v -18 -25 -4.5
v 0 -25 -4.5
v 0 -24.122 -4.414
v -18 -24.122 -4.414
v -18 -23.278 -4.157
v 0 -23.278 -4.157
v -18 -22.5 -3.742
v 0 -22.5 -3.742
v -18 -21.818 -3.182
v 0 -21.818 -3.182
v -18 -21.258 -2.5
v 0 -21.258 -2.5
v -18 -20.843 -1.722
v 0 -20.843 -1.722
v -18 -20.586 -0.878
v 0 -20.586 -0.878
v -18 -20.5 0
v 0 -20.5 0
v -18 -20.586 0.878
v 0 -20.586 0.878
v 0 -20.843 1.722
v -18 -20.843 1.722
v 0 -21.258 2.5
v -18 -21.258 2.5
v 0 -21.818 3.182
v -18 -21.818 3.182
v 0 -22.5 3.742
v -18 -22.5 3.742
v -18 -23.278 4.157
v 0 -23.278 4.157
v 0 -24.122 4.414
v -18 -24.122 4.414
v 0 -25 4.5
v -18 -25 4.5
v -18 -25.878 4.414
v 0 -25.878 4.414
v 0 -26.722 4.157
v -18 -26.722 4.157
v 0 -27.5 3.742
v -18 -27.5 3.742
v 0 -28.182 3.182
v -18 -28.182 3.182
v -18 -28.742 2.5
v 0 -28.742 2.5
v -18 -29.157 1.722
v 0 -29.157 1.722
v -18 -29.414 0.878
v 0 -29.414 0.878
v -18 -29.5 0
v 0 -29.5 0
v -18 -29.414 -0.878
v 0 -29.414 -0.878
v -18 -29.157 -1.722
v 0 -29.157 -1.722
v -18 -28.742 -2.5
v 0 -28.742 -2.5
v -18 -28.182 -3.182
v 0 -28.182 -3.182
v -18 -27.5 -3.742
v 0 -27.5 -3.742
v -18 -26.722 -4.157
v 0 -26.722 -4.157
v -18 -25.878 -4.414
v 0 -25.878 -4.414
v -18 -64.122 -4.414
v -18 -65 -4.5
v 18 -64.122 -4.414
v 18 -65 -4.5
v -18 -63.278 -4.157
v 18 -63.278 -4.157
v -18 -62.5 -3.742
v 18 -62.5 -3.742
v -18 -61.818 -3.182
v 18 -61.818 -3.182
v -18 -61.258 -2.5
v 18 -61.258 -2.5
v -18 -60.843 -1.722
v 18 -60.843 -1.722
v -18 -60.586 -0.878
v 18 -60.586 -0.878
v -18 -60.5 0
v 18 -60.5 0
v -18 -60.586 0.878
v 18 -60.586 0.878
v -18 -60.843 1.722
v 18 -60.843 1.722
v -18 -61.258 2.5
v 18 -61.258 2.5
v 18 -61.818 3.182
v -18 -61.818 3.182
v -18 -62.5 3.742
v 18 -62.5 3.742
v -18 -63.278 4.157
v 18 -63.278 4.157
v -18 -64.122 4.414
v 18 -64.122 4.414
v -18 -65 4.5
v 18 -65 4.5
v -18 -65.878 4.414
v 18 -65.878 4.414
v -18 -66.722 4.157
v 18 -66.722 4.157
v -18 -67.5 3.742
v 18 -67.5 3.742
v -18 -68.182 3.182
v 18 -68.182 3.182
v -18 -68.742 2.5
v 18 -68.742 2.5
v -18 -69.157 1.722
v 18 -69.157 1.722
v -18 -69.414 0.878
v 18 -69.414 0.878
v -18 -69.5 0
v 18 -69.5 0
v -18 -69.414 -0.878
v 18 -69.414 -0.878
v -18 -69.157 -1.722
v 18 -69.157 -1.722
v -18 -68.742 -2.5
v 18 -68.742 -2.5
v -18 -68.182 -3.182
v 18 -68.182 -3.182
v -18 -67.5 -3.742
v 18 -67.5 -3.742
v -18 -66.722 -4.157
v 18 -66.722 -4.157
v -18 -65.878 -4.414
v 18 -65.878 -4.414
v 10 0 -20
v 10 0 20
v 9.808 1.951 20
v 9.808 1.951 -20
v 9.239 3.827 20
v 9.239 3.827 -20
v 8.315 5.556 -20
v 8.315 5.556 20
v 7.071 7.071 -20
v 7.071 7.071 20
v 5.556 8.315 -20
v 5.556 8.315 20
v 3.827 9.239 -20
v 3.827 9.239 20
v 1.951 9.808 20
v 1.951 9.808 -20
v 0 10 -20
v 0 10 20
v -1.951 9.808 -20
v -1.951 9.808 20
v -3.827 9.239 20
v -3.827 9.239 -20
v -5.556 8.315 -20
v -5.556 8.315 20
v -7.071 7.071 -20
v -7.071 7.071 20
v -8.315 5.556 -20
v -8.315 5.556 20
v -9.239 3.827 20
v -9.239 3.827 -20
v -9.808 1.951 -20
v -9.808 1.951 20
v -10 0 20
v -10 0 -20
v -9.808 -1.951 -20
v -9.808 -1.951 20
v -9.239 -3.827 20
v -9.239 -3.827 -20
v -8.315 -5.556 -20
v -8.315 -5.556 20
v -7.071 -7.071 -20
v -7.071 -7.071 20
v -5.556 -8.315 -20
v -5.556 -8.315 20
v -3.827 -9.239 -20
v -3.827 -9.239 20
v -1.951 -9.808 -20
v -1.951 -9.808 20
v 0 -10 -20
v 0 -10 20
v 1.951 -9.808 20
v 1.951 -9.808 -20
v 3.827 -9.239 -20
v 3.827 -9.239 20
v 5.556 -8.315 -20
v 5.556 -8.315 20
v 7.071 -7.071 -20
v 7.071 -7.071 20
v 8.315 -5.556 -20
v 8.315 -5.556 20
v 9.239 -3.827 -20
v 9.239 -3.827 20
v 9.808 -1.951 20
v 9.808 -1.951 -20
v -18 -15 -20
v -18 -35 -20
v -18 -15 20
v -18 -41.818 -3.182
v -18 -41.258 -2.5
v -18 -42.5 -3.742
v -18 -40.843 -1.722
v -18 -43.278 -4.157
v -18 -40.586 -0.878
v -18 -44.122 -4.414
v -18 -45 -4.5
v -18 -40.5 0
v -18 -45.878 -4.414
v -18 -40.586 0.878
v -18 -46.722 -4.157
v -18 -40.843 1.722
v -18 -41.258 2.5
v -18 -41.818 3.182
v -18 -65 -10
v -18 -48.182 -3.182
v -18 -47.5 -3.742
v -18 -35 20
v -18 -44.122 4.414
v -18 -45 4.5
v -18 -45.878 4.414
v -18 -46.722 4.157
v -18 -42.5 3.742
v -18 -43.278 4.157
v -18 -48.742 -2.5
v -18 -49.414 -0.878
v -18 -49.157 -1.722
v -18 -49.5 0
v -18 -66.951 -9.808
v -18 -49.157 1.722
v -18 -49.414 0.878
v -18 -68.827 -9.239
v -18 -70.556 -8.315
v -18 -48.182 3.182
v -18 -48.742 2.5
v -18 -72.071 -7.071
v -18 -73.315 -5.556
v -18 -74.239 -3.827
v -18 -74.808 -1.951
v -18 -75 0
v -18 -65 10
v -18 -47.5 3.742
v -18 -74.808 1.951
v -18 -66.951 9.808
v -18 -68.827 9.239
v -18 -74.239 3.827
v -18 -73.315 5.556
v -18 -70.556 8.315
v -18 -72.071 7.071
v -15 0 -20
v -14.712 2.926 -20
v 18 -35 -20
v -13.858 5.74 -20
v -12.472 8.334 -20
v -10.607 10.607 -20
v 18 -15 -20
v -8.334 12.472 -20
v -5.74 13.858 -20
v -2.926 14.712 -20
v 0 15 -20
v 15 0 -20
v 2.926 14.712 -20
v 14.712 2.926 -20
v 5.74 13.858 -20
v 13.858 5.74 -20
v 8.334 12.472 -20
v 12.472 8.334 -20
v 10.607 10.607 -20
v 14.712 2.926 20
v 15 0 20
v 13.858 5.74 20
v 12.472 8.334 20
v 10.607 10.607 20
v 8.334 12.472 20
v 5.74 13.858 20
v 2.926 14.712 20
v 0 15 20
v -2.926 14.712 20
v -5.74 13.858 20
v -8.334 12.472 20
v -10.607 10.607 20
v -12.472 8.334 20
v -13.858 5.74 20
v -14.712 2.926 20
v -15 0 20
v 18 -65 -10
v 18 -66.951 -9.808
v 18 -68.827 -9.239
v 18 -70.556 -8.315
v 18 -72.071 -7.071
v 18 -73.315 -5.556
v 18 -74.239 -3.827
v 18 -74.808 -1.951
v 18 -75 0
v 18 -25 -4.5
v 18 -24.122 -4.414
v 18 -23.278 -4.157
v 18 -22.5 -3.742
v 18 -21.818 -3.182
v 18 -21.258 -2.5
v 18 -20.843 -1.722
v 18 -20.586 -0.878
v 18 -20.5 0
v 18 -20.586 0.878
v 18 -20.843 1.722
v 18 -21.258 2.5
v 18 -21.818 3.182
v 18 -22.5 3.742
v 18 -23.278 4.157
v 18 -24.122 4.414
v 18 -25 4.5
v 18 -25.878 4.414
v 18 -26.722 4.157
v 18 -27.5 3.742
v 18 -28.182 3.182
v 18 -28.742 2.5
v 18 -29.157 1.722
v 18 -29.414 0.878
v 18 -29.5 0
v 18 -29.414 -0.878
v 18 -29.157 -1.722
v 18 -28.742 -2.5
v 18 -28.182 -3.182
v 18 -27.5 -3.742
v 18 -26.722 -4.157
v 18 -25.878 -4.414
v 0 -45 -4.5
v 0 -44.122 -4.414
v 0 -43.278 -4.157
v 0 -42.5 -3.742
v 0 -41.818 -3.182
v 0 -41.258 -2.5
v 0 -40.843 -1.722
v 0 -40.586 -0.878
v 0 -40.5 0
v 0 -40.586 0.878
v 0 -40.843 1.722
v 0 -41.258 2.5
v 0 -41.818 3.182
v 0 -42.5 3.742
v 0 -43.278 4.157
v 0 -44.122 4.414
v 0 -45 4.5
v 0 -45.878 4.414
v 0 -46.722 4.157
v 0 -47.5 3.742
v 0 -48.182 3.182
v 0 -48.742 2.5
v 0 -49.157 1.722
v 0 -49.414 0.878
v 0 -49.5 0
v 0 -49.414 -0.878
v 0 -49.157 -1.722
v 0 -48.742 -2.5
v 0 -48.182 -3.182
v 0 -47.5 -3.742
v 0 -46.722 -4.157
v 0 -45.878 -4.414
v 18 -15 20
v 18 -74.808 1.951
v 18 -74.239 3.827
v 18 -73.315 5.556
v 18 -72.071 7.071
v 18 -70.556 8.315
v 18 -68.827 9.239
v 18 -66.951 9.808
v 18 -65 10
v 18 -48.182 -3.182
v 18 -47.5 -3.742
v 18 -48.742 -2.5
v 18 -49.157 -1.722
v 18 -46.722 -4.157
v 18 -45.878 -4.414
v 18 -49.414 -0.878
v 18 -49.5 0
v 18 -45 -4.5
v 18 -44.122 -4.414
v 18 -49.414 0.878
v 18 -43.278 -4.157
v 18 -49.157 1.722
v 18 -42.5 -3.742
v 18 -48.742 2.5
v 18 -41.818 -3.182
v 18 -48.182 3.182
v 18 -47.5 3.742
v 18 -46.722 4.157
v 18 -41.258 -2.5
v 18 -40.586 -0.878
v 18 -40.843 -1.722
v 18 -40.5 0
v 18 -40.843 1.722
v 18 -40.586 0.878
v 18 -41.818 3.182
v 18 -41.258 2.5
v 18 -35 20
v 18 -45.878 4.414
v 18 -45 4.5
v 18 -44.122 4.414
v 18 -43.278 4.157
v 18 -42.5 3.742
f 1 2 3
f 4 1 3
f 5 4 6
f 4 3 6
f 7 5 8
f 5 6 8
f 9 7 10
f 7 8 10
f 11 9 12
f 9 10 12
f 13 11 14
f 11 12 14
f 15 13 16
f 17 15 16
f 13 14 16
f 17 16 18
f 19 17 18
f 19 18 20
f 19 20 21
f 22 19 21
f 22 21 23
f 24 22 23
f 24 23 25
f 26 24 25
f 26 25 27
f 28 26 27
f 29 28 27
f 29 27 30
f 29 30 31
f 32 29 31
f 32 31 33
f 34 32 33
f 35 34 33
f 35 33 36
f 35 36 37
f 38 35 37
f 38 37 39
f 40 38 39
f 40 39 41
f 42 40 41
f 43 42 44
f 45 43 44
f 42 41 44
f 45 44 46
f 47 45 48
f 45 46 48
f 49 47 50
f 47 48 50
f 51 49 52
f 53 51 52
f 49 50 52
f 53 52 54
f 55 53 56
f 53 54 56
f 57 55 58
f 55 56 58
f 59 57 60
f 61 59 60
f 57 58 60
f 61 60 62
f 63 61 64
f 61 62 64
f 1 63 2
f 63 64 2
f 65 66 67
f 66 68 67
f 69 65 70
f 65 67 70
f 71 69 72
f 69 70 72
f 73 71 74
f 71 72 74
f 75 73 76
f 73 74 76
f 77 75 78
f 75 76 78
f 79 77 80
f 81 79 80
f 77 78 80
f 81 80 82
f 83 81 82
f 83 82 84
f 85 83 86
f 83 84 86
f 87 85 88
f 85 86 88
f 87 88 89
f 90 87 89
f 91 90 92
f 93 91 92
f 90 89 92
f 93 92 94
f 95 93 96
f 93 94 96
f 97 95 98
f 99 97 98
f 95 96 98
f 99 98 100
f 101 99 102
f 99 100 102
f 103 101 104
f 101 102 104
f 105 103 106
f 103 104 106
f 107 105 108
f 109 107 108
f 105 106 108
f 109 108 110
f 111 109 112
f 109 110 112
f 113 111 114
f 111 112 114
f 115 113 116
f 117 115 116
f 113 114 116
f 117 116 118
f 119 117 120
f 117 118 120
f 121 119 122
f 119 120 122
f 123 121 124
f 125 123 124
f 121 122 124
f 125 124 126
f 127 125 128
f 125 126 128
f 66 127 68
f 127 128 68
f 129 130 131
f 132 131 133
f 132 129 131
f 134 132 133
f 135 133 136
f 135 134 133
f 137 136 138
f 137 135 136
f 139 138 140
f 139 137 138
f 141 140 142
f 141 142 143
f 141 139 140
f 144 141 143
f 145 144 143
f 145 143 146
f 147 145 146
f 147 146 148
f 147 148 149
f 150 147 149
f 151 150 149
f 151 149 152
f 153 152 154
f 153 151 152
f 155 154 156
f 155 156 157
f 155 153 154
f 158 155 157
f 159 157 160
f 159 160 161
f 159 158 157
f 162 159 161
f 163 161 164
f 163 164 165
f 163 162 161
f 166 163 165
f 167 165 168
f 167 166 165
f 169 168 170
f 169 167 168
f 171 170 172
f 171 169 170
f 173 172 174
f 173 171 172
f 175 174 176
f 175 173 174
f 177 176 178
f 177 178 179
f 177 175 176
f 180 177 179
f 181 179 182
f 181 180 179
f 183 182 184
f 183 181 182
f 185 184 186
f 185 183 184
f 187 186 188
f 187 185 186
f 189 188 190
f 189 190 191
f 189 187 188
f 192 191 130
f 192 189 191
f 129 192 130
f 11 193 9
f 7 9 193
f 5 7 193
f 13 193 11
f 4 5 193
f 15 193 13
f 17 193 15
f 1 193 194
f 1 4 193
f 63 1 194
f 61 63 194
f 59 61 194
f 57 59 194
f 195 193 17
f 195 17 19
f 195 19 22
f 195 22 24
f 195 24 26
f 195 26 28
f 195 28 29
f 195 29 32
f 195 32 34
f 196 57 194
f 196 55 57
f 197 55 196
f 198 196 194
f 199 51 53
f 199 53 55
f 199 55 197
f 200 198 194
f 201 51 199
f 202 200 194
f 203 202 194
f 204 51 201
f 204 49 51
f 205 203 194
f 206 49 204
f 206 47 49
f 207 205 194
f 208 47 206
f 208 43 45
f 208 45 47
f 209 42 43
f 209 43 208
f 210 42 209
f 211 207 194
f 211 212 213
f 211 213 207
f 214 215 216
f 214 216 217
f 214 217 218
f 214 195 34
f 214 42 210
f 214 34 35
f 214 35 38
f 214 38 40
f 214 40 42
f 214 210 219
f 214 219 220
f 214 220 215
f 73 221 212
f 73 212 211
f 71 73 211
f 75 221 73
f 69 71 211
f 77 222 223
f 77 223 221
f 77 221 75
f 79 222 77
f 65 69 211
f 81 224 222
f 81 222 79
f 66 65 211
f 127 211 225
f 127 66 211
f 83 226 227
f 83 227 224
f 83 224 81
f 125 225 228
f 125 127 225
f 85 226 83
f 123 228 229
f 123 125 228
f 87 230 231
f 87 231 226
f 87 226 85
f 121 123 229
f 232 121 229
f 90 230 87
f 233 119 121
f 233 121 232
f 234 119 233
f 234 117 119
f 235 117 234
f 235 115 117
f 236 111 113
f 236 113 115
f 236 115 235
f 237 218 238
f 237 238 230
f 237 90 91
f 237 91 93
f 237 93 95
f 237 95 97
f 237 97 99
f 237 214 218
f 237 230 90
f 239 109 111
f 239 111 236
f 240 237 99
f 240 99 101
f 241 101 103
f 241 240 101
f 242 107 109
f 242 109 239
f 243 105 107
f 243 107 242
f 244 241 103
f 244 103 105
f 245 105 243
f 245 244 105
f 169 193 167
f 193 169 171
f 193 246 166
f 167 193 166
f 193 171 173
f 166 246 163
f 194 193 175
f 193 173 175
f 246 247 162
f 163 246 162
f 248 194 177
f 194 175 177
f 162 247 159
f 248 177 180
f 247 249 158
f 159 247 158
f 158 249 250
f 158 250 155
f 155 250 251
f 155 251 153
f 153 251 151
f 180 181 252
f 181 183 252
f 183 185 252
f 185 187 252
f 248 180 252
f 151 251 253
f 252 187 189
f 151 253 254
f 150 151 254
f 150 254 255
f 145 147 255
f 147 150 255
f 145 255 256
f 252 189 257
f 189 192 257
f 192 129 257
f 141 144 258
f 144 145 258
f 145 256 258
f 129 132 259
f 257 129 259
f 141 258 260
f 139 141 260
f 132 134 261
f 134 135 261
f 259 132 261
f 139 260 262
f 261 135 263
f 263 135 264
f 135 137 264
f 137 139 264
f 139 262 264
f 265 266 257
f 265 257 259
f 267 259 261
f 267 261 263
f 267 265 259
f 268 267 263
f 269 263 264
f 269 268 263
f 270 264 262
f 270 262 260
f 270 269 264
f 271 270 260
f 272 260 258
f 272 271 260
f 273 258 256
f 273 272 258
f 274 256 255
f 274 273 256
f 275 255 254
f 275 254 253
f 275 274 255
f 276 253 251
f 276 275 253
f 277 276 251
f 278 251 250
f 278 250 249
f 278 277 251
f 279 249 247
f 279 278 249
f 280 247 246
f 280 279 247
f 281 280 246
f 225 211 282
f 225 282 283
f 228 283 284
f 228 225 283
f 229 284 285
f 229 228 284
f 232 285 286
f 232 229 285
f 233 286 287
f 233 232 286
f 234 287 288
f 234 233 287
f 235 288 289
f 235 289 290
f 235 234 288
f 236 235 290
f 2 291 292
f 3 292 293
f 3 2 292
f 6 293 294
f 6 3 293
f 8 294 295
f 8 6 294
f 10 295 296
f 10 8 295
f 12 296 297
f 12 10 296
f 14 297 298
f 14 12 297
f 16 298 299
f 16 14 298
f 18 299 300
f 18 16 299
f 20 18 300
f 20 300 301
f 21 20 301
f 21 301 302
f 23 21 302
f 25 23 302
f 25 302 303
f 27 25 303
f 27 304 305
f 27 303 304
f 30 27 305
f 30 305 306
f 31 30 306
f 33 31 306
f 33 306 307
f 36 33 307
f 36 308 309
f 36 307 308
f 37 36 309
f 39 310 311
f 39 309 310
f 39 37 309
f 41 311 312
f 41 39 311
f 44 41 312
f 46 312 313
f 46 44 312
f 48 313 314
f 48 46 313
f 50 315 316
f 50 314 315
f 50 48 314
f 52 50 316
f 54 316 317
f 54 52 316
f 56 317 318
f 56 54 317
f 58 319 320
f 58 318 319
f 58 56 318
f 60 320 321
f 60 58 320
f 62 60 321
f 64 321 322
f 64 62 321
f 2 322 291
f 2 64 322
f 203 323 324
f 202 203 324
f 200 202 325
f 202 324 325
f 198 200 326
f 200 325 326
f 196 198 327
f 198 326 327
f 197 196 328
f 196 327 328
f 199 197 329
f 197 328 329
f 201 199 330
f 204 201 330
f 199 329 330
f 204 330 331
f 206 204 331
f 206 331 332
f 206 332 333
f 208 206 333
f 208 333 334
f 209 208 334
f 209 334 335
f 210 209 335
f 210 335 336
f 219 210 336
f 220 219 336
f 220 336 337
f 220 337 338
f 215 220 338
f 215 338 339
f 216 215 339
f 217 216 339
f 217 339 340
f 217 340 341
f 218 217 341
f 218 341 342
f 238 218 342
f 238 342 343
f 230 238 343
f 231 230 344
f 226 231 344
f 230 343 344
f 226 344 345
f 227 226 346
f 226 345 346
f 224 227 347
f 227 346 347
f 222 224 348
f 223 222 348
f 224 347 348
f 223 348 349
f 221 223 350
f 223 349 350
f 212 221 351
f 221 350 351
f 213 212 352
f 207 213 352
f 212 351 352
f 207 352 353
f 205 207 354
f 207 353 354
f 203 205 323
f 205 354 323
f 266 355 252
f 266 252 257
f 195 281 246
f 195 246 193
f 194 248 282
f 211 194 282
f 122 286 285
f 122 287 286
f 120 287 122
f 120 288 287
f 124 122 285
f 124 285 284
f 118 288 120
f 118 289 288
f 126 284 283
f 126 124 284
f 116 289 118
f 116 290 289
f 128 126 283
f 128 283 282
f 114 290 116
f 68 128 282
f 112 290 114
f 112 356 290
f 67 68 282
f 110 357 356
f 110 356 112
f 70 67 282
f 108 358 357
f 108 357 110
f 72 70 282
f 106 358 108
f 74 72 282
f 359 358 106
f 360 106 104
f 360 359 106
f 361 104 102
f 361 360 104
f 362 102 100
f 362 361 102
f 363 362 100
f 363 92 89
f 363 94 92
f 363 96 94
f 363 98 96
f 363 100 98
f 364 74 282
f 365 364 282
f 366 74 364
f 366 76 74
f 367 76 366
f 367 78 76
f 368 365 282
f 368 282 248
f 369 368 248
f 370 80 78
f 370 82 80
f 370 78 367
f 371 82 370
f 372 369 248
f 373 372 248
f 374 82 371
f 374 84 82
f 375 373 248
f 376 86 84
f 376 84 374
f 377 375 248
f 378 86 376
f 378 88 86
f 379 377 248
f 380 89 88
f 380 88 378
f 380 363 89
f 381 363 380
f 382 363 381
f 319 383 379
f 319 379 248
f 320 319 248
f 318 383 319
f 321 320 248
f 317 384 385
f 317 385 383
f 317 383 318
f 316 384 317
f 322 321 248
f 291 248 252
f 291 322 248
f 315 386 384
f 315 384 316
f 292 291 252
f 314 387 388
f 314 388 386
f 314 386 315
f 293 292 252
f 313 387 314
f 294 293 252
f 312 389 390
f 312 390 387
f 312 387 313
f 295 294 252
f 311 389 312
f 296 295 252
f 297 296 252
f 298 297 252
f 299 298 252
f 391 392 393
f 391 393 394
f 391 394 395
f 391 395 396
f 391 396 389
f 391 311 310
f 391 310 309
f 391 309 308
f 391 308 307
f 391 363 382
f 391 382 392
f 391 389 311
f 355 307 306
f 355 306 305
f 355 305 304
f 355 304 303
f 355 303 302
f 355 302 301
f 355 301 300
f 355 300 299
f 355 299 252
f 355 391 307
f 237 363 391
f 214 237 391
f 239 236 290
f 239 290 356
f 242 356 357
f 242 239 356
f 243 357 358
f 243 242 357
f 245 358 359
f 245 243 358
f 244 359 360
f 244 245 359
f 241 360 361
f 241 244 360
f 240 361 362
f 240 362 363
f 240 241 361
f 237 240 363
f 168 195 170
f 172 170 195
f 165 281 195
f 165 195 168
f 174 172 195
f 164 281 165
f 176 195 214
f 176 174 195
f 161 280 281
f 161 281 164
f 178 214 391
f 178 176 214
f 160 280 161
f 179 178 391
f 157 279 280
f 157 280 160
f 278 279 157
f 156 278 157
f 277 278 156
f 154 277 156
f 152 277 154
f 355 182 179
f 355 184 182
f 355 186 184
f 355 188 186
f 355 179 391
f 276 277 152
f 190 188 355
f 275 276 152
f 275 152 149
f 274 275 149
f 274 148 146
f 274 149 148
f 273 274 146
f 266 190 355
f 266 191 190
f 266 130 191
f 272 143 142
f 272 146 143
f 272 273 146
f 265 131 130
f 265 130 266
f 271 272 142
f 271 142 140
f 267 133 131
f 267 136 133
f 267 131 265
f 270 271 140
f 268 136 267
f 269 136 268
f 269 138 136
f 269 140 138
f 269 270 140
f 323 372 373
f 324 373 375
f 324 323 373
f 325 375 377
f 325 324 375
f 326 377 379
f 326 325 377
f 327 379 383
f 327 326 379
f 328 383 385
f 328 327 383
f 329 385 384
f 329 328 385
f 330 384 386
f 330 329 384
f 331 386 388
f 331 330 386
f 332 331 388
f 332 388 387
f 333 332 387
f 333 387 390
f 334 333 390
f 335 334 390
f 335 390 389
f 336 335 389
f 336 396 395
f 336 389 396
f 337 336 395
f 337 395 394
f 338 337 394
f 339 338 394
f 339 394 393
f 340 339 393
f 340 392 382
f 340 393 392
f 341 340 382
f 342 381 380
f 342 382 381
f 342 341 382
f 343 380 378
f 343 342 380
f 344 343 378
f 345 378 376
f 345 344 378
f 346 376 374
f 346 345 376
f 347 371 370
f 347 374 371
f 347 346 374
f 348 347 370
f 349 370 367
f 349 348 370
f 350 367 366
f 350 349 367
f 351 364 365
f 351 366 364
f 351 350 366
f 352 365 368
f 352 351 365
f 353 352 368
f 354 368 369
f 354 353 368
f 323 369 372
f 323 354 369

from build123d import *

# Parameters (mm, degrees)
SKETCH_1_R               = 10
EXTRUDE_1_DEPTH          = 20
SKETCH_2_R               = 4.5
CUT_EXTRUDE_1_DEPTH      = 20
CUT_EXTRUDE_2_DEPTH      = 86.562842403
CUT_EXTRUDE_2_DEPTH_BACK = 86.562842403


with BuildPart() as part:
    # 草图1 → 凸台-拉伸1 (new, symmetric)
    with BuildSketch(Plane.XY):
        with BuildLine():
            Line((0, -75), (18, -75))
            Line((18, -75), (18, -15))
            Line((18, -15), (15, 0))
            ThreePointArc((15, 0), (0, 15), (-15, 0))
            Line((-15, 0), (-18, -15))
            Line((-18, -15), (-18, -75))
            Line((-18, -75), (0, -75))
        make_face()
        Circle(SKETCH_1_R, mode=Mode.SUBTRACT)
    extrude(amount=EXTRUDE_1_DEPTH, both=True)

    # 草图2 → 切除-拉伸1 (cut, symmetric)
    with BuildSketch(Plane(origin=(0, 0, 0), x_dir=(0, 0, -1), z_dir=(1, 0, 0))):
        with Locations((0, -45)):
            Circle(SKETCH_2_R)
        with Locations((0, -25)):
            Circle(SKETCH_2_R)
        with Locations((0, -65)):
            Circle(SKETCH_2_R)
    extrude(amount=CUT_EXTRUDE_1_DEPTH, both=True, mode=Mode.SUBTRACT)

    # 草图7 → 切除-拉伸2 (cut, two sides: drawn at the far end of the back side and taken through both)
    with BuildSketch(Plane(origin=(18, 0, 0), x_dir=(0, 0, -1), z_dir=(1, 0, 0)).offset(-CUT_EXTRUDE_2_DEPTH_BACK)):
        with BuildLine():
            Line((-10, -65), (-20, -35))
            Line((-20, -35), (-20, -75))
            Line((-20, -75), (0, -75))
            ThreePointArc((0, -75), (-7.071067812, -72.071067812), (-10, -65))
        make_face()
        with BuildLine():
            ThreePointArc((10, -65), (7.071067812, -72.071067812), (0, -75))
            Line((0, -75), (20, -75))
            Line((20, -75), (20, -35))
            Line((20, -35), (10, -65))
        make_face()
    extrude(amount=CUT_EXTRUDE_2_DEPTH + CUT_EXTRUDE_2_DEPTH_BACK, mode=Mode.SUBTRACT)


solid = part.part
